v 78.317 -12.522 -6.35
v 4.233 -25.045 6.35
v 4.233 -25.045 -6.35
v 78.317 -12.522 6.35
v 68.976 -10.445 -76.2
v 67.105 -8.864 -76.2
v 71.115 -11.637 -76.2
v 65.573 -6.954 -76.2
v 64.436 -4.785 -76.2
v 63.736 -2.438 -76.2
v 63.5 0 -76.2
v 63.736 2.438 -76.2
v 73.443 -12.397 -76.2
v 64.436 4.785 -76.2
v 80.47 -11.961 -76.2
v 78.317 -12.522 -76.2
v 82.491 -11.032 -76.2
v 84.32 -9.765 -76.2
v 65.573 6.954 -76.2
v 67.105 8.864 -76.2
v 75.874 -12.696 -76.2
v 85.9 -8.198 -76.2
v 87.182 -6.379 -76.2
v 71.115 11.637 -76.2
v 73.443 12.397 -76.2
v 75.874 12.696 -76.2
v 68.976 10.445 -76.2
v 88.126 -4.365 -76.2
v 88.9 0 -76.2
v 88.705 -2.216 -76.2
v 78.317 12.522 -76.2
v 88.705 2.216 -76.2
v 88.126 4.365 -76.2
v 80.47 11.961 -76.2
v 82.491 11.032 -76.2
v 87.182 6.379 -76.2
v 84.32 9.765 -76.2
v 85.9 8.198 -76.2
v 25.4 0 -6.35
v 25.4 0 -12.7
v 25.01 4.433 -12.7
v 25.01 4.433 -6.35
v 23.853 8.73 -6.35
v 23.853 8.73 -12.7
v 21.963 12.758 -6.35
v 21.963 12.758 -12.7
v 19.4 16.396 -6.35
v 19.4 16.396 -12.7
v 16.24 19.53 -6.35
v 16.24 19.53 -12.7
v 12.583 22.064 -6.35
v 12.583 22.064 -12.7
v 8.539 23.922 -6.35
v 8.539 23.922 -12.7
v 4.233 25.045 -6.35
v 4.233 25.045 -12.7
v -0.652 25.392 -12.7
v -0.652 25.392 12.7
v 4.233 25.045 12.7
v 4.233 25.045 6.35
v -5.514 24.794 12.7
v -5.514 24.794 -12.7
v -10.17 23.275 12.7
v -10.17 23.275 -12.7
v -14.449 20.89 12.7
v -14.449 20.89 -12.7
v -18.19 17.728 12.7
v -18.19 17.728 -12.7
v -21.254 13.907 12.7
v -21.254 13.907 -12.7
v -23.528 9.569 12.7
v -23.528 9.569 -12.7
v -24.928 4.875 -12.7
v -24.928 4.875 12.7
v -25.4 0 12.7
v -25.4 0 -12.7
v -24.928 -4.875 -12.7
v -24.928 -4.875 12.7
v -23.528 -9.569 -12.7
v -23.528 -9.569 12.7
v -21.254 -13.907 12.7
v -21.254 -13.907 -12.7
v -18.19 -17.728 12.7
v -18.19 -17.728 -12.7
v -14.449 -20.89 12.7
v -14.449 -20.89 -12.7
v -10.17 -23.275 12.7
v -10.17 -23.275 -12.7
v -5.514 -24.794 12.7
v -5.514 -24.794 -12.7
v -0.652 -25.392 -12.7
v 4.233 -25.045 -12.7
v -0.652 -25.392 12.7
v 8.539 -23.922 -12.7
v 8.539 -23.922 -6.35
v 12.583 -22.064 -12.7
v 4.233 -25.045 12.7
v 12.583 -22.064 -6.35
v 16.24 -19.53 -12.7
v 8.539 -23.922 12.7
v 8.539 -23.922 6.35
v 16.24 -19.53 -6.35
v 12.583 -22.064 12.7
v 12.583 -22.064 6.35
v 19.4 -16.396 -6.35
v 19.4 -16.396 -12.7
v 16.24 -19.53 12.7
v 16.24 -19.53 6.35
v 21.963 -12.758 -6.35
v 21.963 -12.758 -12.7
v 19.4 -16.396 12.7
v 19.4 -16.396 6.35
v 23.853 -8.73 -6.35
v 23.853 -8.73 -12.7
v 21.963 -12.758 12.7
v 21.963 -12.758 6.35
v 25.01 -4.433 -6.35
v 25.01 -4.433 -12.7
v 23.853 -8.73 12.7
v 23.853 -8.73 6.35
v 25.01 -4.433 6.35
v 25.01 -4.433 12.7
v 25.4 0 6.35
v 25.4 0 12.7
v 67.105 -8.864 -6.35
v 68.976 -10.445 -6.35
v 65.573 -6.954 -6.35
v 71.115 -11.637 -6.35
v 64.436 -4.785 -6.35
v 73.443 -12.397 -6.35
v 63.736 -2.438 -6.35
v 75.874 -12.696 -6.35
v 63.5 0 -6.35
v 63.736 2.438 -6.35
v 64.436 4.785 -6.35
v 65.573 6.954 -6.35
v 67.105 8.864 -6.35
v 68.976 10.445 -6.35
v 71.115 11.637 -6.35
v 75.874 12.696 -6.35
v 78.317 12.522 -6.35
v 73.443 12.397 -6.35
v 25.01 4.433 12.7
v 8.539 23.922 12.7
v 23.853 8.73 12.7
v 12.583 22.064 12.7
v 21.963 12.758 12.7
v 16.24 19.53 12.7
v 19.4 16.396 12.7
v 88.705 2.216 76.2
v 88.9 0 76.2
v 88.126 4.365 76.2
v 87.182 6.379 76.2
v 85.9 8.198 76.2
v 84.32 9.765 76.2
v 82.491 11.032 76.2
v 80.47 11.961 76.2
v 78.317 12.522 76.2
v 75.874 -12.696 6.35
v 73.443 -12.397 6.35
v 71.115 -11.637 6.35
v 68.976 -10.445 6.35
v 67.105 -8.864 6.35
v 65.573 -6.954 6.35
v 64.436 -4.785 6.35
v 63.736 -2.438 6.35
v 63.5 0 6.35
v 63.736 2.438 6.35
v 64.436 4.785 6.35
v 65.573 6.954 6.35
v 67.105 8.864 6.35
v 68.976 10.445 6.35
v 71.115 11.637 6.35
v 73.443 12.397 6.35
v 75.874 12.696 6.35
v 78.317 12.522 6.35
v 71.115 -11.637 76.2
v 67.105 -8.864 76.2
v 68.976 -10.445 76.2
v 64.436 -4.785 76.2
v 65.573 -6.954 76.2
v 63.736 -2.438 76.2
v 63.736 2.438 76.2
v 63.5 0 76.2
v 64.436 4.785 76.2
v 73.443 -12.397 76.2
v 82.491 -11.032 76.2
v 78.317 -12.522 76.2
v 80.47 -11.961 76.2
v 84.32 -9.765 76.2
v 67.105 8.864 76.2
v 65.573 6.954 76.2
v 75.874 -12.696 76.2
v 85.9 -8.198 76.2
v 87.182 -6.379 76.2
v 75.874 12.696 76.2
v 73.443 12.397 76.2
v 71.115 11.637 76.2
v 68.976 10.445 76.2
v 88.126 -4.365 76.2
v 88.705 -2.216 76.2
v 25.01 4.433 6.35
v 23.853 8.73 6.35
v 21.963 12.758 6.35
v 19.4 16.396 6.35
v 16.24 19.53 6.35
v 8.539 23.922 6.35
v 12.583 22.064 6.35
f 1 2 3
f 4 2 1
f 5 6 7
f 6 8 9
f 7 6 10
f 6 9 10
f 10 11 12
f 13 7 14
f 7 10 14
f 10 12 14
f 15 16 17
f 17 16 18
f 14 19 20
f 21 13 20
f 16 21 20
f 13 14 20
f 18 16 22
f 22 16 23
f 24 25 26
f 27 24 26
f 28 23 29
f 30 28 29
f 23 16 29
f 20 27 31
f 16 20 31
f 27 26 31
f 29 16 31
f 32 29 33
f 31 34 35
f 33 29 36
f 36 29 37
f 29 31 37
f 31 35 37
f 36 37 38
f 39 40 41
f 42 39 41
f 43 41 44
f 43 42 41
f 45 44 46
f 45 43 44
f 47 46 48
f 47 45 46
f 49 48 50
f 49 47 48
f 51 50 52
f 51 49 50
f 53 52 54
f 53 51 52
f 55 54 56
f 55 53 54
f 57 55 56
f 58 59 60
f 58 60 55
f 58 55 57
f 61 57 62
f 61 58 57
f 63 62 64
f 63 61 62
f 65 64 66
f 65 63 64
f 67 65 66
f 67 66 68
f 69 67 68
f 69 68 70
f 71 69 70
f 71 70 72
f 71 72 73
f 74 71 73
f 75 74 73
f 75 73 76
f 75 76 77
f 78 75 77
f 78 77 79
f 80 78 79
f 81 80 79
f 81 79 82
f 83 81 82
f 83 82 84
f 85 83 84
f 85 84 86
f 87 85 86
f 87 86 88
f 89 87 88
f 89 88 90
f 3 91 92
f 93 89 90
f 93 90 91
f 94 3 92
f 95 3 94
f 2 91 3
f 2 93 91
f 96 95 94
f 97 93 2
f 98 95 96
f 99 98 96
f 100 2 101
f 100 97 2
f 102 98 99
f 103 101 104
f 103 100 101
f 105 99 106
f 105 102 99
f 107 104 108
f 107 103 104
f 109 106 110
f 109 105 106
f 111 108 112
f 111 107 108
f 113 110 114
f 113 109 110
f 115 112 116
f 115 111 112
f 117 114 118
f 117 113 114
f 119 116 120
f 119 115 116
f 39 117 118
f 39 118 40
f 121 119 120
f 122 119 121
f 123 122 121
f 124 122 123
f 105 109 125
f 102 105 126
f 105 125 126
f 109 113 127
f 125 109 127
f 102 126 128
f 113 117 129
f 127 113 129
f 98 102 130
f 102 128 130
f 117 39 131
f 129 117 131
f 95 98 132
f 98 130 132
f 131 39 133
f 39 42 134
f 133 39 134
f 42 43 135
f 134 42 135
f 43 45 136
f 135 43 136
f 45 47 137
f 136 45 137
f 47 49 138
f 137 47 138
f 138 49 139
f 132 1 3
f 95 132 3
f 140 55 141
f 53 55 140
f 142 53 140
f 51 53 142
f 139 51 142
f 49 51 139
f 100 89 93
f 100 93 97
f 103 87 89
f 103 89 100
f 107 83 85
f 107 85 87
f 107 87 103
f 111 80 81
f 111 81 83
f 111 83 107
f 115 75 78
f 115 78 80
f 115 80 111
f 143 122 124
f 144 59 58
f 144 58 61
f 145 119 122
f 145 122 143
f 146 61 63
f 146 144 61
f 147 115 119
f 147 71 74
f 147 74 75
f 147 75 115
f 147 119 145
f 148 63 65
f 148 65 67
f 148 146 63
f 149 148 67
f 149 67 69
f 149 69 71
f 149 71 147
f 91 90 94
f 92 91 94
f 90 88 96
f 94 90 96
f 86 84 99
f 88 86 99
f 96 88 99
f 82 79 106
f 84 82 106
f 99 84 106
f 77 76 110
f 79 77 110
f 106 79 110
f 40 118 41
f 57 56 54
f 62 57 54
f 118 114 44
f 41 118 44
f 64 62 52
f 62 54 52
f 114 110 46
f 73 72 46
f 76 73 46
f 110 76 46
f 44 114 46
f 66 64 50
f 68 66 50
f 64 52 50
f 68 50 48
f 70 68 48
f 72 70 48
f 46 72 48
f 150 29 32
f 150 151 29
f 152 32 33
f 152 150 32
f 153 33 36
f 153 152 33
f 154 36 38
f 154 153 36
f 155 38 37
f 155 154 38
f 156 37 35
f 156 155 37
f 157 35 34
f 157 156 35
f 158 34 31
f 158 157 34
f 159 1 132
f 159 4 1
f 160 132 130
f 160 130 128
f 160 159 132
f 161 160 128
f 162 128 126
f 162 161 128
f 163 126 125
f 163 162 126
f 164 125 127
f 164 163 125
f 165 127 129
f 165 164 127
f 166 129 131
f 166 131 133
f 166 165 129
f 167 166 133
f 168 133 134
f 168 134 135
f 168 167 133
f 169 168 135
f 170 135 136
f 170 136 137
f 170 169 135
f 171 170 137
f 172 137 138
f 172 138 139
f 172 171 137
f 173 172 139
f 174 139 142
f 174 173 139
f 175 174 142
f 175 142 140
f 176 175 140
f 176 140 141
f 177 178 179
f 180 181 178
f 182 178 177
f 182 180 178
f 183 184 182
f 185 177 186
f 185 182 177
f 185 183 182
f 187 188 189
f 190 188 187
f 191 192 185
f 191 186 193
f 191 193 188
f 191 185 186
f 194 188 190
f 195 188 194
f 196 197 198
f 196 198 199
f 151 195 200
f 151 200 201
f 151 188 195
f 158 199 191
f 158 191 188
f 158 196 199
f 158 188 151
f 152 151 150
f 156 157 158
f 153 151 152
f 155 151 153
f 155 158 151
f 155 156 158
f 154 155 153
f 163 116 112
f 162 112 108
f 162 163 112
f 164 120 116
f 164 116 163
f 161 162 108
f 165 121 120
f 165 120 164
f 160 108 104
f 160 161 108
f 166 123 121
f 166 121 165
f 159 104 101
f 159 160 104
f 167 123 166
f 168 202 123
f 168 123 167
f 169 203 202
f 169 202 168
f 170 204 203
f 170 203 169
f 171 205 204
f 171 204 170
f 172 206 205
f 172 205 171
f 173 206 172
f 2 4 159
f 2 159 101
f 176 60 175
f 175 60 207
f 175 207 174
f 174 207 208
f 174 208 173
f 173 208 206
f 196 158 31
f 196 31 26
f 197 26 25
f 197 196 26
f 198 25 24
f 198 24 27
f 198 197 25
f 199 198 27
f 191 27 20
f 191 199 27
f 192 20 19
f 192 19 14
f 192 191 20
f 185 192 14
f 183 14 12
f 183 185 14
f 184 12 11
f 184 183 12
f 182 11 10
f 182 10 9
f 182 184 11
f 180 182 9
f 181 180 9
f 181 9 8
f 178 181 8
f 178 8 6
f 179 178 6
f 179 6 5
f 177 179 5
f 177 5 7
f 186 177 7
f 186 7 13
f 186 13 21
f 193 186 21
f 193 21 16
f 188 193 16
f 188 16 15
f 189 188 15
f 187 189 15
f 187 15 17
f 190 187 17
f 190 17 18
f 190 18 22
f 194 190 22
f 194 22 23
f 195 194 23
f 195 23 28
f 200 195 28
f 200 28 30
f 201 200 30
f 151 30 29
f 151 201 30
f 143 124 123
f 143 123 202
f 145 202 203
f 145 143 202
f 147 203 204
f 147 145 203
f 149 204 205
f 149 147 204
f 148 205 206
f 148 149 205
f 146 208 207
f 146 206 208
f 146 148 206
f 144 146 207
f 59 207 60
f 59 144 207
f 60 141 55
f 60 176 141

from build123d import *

# Parameters (mm, degrees)
F1_DEPTH = 12.7
F2_DEPTH = 6.35
F3_DEPTH = 76.2


# Not quite as in the source:
# - the program builds the solid bodies; features that only make, move or delete a surface that nothing else refers to are left out


with BuildPart() as f1:
    # F0 (on Top) → F1 (new body, symmetric)
    with BuildSketch(Plane.XY):
        with BuildLine():
            ThreePointArc((4.2333333333, -25.0447377485), (19.399570442, -16.3956294989), (25.4, 0))
            ThreePointArc((25.4, 0), (19.399570442, 16.3956294989), (4.2333333333, 25.0447377485))
            ThreePointArc((4.2333333333, 25.0447377485), (-25.4, 0), (4.2333333333, -25.0447377485))
        make_face()
    extrude(amount=F1_DEPTH, both=True)

    # F0 (on Top) → F2 (join, symmetric)
    with BuildSketch(Plane.XY):
        with BuildLine():
            ThreePointArc((4.2333333333, 25.0447377485), (19.399570442, 16.3956294989), (25.4, 0))
            ThreePointArc((25.4, 0), (19.399570442, -16.3956294989), (4.2333333333, -25.0447377485))
            Line((4.2333333333, -25.0447377485), (78.3166666667, -12.5223688742))
            ThreePointArc((78.3166666667, -12.5223688742), (63.5, 0), (78.3166666667, 12.5223688742))
            Line((78.3166666667, 12.5223688742), (4.2333333333, 25.0447377485))
        make_face()
    extrude(amount=F2_DEPTH, both=True)


with BuildPart() as f3:
    # F0 (on Top) → F3 (new body, symmetric)
    with BuildSketch(Plane.XY):
        with BuildLine():
            ThreePointArc((88.9, 0), (85.899785221, 8.1978147495), (78.3166666667, 12.5223688742))
            ThreePointArc((78.3166666667, 12.5223688742), (63.5, 0), (78.3166666667, -12.5223688742))
            ThreePointArc((78.3166666667, -12.5223688742), (85.899785221, -8.1978147495), (88.9, 0))
        make_face()
    extrude(amount=F3_DEPTH, both=True)


solid = Compound([f1.part, f3.part])
